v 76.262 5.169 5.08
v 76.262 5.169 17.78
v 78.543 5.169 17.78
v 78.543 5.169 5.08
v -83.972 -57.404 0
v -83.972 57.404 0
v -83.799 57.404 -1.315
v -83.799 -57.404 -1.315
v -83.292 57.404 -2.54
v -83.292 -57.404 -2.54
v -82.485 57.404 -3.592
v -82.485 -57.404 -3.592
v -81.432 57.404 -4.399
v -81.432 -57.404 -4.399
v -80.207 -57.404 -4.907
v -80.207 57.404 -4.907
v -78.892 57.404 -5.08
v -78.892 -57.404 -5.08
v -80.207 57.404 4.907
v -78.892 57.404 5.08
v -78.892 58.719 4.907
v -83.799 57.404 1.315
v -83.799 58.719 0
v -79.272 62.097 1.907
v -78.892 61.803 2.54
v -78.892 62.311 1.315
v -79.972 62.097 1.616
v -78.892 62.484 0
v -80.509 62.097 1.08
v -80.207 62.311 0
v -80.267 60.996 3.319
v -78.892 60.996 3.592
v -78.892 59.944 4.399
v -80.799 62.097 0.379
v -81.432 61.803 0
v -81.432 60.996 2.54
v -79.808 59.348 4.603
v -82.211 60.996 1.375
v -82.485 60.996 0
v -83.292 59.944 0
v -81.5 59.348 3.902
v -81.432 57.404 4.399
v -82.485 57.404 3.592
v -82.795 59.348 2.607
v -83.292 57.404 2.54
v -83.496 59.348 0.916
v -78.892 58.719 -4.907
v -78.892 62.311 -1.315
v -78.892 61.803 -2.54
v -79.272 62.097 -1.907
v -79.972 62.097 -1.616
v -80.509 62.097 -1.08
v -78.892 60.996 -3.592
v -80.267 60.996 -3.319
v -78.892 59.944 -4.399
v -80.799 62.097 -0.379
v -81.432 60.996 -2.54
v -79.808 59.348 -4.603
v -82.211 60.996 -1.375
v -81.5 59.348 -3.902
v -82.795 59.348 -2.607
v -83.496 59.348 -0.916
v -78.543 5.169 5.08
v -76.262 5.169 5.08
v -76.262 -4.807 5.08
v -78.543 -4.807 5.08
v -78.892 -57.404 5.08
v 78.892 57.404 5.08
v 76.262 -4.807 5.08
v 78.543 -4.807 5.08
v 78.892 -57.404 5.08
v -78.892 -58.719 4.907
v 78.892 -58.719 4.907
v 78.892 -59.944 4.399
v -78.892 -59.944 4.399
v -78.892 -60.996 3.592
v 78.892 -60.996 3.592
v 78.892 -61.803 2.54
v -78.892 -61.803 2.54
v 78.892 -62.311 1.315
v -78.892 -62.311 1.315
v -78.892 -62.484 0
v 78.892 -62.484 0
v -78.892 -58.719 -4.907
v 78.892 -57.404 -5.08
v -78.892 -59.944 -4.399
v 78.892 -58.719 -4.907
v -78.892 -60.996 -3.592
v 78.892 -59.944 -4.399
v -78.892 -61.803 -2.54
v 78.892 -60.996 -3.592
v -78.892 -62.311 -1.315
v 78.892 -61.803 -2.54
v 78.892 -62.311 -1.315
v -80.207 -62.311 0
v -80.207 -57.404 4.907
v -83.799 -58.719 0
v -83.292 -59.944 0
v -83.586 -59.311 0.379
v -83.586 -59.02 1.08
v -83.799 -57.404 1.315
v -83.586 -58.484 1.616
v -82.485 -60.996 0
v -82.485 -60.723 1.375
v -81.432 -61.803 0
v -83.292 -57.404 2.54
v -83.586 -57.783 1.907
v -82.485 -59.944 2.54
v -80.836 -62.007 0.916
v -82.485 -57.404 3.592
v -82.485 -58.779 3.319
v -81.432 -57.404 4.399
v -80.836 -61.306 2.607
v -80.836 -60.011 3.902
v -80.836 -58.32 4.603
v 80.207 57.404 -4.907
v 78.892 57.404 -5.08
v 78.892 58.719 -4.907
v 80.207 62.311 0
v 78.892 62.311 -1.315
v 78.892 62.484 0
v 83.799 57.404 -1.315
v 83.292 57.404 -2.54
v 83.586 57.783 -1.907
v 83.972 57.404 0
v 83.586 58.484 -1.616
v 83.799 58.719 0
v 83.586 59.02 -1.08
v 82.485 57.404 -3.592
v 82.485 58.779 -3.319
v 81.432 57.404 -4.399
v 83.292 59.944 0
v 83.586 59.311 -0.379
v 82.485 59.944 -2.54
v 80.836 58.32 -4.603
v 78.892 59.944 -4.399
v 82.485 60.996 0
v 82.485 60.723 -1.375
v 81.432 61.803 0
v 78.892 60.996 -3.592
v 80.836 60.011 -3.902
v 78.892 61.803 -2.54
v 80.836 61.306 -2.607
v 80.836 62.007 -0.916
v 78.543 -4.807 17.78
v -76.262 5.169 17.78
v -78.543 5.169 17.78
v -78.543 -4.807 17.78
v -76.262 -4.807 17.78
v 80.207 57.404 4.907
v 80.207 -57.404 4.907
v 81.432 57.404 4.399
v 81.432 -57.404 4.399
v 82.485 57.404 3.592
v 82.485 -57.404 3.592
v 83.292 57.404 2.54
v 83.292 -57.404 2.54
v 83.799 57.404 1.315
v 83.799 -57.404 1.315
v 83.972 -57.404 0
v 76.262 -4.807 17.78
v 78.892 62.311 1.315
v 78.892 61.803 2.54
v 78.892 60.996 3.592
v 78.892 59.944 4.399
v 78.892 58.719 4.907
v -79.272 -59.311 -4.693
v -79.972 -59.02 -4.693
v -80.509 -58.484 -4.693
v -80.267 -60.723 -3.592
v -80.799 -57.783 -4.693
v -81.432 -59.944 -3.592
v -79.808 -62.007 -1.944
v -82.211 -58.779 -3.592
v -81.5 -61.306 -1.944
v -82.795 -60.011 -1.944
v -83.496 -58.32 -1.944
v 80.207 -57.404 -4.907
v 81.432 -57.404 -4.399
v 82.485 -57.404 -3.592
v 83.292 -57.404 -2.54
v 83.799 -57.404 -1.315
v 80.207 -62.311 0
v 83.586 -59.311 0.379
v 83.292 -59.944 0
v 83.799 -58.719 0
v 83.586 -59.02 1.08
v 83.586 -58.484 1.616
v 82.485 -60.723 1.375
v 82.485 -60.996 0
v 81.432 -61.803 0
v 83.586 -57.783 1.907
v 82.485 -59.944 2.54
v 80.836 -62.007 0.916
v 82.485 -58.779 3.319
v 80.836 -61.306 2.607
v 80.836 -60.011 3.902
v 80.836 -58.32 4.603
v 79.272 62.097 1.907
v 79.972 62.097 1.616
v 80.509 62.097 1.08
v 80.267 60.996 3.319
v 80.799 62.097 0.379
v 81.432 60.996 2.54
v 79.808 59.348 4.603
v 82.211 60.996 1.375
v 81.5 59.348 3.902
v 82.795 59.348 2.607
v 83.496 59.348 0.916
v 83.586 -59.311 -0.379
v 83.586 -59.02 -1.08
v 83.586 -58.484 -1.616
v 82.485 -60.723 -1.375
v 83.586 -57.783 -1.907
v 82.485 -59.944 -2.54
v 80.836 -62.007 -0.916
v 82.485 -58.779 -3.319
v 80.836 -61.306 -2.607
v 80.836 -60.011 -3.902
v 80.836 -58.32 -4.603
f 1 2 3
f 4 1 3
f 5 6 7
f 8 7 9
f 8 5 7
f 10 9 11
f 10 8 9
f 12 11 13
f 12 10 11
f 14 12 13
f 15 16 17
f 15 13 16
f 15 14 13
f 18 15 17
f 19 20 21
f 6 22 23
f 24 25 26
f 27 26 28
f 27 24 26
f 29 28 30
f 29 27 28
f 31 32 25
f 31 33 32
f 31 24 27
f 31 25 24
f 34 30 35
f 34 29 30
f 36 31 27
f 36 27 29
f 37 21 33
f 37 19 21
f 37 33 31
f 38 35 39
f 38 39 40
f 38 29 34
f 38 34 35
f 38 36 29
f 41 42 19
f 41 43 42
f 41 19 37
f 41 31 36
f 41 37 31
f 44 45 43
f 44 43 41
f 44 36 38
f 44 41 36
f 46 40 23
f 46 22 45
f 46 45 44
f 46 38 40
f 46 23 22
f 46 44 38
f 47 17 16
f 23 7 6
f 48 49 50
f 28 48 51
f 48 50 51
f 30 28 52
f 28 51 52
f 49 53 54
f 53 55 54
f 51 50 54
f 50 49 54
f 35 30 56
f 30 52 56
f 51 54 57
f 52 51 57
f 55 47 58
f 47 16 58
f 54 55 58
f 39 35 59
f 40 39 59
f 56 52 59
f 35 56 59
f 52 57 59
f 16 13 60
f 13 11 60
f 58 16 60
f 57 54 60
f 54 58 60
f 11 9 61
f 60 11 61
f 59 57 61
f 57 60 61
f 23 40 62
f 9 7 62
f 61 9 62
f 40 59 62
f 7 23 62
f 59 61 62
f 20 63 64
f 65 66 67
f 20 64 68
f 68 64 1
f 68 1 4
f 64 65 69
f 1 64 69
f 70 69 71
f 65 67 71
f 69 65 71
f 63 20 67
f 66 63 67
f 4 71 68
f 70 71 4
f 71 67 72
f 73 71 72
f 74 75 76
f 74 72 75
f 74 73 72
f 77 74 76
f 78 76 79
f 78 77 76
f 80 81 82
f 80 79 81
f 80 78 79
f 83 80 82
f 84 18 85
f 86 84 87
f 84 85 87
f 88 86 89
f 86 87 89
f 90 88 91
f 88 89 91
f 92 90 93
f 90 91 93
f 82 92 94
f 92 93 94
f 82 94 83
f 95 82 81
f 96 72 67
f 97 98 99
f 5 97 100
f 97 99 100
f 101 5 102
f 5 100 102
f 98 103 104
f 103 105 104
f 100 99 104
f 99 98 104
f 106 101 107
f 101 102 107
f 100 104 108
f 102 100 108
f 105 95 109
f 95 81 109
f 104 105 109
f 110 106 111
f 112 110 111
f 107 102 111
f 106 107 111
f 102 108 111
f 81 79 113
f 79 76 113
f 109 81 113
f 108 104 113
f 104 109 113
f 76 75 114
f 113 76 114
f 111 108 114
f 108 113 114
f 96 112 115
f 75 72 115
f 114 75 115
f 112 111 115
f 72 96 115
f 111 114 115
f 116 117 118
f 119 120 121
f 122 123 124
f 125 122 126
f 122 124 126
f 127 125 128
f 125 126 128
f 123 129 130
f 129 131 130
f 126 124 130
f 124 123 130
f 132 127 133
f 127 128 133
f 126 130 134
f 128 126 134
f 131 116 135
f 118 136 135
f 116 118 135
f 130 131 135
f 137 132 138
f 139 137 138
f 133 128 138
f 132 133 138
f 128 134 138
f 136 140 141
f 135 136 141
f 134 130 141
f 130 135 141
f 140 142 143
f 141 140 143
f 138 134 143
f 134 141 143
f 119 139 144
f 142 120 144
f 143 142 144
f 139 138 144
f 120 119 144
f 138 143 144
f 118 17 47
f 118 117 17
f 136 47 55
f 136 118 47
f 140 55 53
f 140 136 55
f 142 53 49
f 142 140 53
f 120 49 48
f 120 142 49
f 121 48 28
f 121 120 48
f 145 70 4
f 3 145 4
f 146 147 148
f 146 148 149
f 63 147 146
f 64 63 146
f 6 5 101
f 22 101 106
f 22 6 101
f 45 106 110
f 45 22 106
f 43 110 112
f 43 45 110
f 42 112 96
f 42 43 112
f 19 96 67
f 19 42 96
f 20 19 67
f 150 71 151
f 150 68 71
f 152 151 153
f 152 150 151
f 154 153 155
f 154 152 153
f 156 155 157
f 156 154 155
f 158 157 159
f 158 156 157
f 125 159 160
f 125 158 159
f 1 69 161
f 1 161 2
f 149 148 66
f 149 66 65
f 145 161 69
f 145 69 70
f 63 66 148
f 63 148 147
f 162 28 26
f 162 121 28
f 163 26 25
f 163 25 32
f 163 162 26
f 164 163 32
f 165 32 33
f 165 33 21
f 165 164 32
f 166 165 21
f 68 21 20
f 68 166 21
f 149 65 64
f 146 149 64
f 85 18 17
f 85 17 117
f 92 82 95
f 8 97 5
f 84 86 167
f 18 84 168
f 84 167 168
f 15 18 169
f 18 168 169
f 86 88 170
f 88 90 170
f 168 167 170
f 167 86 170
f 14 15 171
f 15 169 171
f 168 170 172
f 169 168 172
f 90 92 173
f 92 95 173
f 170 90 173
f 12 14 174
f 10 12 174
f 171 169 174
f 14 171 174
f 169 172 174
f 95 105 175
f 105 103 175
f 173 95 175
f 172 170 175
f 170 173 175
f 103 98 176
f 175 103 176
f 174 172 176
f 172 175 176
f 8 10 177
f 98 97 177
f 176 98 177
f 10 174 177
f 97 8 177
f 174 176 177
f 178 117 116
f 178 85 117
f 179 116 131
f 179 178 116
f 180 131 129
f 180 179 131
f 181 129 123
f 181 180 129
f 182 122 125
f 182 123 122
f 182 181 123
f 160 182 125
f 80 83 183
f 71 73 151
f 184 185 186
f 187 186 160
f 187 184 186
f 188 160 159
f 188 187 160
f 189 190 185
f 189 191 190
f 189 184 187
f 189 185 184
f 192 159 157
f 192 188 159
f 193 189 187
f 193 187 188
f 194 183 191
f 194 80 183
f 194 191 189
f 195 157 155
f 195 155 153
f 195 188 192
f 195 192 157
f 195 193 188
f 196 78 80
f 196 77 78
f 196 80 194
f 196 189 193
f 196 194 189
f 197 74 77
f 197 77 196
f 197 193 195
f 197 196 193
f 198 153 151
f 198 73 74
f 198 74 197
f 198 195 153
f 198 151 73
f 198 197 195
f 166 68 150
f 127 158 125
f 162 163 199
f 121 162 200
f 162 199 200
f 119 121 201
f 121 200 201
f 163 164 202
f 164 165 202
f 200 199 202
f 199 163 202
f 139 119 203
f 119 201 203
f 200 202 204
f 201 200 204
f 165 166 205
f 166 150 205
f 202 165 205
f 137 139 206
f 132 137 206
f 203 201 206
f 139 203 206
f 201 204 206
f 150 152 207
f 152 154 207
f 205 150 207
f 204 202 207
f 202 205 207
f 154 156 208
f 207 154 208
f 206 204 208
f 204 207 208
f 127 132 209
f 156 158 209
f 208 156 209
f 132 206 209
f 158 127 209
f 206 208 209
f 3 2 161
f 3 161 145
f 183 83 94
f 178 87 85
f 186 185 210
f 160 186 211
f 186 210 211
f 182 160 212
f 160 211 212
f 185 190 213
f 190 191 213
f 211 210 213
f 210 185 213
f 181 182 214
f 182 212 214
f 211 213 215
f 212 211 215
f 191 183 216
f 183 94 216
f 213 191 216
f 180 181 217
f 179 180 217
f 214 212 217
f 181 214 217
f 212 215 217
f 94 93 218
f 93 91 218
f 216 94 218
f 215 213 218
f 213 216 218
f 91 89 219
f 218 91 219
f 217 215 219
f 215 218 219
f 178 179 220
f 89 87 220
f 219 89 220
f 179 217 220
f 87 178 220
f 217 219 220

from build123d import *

# Parameters (mm, degrees)
F0_W     = 167.9448
F0_H     = 10.16
F1_DEPTH = 62.484
F2_W     = 2.2802874446
F2_H     = 9.9761183374
F3_DEPTH = 12.7
F4_R     = 5.07999


# Not quite as in the source:
# - a fillet or chamfer is up to 0.001 mm smaller than in the source, because OpenCascade refuses the exact size


with BuildPart() as f1:
    # F0 (on Front) → F1 (new body, symmetric)
    with BuildSketch(Plane.XZ):
        Rectangle(F0_W, F0_H)
    extrude(amount=F1_DEPTH, both=True)

    # F2 (on face) → F3 (join)
    with BuildSketch(Plane.XY.offset(5.08)):
        with Locations((-77.4024613202, 0.1807718072)):
            Rectangle(F2_W, F2_H)
        with Locations((77.4024613202, 0.1807718072)):
            Rectangle(F2_W, F2_H)
    extrude(amount=F3_DEPTH)

    # F4 (radius 5.08 in the source; OpenCascade refuses exactly that, so slightly less here)
    f4_edges = [f1.edges().sort_by_distance(p)[0] for p in [
        (0, -62.484, 5.08),
        (-83.9724, -62.484, 0),
        (0, -62.484, -5.08),
        (83.9724, -62.484, 0),
        (83.9724, 0, 5.08),
        (-83.9724, 0, 5.08),
        (0, 62.484, 5.08),
        (-83.9724, 0, -5.08),
        (0, 62.484, -5.08),
        (83.9724, 0, -5.08),
        (83.9724, 62.484, 0),
        (-83.9724, 62.484, 0),
    ]]
    fillet(f4_edges, radius=F4_R)


solid = f1.part
